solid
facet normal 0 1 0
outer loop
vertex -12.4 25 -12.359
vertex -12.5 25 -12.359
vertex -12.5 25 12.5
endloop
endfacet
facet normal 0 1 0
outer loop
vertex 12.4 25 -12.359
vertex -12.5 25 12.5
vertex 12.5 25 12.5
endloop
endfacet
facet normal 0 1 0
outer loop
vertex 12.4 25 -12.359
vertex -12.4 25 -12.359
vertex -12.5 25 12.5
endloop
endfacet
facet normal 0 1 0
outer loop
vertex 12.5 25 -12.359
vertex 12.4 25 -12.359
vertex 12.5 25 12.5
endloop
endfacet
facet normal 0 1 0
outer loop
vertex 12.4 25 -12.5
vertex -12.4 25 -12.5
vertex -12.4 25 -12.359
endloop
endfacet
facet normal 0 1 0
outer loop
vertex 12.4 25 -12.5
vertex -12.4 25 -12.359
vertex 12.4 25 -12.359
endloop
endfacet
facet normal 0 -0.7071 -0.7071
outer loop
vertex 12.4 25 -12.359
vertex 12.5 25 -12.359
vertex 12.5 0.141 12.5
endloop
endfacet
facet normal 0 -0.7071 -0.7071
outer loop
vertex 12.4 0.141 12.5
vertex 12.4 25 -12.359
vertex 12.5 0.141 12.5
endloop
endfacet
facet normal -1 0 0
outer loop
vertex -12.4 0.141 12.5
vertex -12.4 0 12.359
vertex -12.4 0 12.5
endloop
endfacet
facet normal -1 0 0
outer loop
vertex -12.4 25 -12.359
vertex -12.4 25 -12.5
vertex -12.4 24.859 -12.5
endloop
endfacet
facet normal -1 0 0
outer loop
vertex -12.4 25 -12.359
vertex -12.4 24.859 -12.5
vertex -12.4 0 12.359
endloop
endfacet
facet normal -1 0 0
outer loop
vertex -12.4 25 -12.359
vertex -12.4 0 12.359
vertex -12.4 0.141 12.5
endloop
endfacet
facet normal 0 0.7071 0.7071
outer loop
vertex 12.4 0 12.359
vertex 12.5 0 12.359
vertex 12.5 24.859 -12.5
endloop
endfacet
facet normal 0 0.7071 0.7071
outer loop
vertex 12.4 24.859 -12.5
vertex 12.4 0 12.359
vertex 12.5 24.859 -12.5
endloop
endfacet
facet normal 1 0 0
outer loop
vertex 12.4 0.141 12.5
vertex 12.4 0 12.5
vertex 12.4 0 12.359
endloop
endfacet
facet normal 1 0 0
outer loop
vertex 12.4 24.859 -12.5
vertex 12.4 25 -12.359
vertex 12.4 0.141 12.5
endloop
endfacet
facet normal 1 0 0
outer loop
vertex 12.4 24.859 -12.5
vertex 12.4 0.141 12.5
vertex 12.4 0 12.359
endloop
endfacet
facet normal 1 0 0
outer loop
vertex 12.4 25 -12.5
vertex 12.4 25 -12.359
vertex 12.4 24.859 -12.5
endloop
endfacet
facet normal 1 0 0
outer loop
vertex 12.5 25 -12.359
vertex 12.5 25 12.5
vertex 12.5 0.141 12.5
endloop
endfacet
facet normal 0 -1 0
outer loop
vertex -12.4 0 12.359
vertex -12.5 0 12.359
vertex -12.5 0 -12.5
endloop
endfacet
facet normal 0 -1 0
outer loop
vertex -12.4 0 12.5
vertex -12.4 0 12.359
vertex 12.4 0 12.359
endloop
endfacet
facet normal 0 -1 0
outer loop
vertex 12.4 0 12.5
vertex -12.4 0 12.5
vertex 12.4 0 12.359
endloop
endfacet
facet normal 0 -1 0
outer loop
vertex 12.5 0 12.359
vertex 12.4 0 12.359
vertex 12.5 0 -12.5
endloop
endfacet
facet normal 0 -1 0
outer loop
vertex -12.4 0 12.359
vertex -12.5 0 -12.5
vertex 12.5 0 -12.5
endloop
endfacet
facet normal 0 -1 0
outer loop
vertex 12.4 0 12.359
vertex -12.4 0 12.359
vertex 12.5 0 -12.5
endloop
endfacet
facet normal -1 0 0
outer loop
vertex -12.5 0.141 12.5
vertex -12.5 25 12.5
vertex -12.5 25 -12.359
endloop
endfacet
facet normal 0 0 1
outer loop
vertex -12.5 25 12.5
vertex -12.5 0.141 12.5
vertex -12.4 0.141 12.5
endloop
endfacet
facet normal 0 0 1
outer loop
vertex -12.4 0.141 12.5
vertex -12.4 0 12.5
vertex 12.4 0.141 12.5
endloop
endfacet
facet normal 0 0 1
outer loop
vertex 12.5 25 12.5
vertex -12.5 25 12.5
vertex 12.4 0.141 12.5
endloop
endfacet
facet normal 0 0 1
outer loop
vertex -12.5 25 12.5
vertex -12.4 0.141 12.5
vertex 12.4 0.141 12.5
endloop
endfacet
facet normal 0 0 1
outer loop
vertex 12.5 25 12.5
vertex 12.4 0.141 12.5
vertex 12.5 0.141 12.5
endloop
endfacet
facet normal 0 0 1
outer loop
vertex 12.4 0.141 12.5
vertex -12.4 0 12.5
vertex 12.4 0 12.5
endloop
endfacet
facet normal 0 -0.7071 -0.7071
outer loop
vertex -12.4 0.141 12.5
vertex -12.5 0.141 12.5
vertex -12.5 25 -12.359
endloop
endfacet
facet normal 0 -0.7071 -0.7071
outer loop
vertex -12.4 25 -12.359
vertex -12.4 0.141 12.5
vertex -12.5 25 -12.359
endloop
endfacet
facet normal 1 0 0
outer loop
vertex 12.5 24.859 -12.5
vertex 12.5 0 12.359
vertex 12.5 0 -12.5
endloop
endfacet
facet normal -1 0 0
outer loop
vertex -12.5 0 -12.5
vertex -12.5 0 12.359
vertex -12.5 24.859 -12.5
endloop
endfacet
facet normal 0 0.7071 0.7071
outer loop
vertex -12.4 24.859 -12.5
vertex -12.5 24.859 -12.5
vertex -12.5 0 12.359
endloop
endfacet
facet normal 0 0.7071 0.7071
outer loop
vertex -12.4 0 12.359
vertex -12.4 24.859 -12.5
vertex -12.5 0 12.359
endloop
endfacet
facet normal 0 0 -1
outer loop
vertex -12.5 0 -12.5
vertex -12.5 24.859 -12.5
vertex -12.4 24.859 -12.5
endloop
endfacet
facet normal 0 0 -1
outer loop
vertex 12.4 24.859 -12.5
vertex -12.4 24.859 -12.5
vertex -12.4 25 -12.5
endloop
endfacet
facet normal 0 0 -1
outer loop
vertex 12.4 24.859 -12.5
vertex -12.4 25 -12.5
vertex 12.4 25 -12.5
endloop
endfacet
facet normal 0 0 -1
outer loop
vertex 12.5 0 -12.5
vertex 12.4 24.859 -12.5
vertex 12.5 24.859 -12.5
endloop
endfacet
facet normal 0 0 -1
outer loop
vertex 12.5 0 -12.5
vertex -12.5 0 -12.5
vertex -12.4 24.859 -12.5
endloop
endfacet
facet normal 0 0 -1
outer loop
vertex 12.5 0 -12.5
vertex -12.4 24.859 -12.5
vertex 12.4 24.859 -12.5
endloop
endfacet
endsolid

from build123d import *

# Parameters (mm, degrees)
SKETCH_1_W          = 25
SKETCH_1_H          = 25
EXTRUDE_1_DEPTH     = 25
CUT_EXTRUDE_1_DEPTH = 0.1
CUT_EXTRUDE_2_DEPTH = 0.1


with BuildPart() as part:
    # 草图1 → 凸台-拉伸1 (new body)
    with BuildSketch(Plane(origin=(0, 0, 0), x_dir=(1, 0, 0), z_dir=(0, 1, 0))):
        Rectangle(SKETCH_1_W, SKETCH_1_H)
    extrude(amount=EXTRUDE_1_DEPTH)

    # 草图2 → 切除-拉伸1 (cut)
    with BuildSketch(Plane(origin=(12.5, 0, 0), x_dir=(0, 0, -1), z_dir=(1, 0, 0))):
        Polygon((12.429289322, 25.070710678), (-12.570710678, 0.070710678), (-12.429289322, -0.070710678), (12.570710678, 24.929289322), align=None)
    extrude(amount=-CUT_EXTRUDE_1_DEPTH, mode=Mode.SUBTRACT)

    # 草图3 → 切除-拉伸2 (cut)
    with BuildSketch(Plane.ZY.offset(12.5)):
        Polygon((12.570710678, 0.070710678), (-12.429289322, 25.070710678), (-12.570710678, 24.929289322), (12.429289322, -0.070710678), align=None)
    extrude(amount=-CUT_EXTRUDE_2_DEPTH, mode=Mode.SUBTRACT)


solid = part.part
